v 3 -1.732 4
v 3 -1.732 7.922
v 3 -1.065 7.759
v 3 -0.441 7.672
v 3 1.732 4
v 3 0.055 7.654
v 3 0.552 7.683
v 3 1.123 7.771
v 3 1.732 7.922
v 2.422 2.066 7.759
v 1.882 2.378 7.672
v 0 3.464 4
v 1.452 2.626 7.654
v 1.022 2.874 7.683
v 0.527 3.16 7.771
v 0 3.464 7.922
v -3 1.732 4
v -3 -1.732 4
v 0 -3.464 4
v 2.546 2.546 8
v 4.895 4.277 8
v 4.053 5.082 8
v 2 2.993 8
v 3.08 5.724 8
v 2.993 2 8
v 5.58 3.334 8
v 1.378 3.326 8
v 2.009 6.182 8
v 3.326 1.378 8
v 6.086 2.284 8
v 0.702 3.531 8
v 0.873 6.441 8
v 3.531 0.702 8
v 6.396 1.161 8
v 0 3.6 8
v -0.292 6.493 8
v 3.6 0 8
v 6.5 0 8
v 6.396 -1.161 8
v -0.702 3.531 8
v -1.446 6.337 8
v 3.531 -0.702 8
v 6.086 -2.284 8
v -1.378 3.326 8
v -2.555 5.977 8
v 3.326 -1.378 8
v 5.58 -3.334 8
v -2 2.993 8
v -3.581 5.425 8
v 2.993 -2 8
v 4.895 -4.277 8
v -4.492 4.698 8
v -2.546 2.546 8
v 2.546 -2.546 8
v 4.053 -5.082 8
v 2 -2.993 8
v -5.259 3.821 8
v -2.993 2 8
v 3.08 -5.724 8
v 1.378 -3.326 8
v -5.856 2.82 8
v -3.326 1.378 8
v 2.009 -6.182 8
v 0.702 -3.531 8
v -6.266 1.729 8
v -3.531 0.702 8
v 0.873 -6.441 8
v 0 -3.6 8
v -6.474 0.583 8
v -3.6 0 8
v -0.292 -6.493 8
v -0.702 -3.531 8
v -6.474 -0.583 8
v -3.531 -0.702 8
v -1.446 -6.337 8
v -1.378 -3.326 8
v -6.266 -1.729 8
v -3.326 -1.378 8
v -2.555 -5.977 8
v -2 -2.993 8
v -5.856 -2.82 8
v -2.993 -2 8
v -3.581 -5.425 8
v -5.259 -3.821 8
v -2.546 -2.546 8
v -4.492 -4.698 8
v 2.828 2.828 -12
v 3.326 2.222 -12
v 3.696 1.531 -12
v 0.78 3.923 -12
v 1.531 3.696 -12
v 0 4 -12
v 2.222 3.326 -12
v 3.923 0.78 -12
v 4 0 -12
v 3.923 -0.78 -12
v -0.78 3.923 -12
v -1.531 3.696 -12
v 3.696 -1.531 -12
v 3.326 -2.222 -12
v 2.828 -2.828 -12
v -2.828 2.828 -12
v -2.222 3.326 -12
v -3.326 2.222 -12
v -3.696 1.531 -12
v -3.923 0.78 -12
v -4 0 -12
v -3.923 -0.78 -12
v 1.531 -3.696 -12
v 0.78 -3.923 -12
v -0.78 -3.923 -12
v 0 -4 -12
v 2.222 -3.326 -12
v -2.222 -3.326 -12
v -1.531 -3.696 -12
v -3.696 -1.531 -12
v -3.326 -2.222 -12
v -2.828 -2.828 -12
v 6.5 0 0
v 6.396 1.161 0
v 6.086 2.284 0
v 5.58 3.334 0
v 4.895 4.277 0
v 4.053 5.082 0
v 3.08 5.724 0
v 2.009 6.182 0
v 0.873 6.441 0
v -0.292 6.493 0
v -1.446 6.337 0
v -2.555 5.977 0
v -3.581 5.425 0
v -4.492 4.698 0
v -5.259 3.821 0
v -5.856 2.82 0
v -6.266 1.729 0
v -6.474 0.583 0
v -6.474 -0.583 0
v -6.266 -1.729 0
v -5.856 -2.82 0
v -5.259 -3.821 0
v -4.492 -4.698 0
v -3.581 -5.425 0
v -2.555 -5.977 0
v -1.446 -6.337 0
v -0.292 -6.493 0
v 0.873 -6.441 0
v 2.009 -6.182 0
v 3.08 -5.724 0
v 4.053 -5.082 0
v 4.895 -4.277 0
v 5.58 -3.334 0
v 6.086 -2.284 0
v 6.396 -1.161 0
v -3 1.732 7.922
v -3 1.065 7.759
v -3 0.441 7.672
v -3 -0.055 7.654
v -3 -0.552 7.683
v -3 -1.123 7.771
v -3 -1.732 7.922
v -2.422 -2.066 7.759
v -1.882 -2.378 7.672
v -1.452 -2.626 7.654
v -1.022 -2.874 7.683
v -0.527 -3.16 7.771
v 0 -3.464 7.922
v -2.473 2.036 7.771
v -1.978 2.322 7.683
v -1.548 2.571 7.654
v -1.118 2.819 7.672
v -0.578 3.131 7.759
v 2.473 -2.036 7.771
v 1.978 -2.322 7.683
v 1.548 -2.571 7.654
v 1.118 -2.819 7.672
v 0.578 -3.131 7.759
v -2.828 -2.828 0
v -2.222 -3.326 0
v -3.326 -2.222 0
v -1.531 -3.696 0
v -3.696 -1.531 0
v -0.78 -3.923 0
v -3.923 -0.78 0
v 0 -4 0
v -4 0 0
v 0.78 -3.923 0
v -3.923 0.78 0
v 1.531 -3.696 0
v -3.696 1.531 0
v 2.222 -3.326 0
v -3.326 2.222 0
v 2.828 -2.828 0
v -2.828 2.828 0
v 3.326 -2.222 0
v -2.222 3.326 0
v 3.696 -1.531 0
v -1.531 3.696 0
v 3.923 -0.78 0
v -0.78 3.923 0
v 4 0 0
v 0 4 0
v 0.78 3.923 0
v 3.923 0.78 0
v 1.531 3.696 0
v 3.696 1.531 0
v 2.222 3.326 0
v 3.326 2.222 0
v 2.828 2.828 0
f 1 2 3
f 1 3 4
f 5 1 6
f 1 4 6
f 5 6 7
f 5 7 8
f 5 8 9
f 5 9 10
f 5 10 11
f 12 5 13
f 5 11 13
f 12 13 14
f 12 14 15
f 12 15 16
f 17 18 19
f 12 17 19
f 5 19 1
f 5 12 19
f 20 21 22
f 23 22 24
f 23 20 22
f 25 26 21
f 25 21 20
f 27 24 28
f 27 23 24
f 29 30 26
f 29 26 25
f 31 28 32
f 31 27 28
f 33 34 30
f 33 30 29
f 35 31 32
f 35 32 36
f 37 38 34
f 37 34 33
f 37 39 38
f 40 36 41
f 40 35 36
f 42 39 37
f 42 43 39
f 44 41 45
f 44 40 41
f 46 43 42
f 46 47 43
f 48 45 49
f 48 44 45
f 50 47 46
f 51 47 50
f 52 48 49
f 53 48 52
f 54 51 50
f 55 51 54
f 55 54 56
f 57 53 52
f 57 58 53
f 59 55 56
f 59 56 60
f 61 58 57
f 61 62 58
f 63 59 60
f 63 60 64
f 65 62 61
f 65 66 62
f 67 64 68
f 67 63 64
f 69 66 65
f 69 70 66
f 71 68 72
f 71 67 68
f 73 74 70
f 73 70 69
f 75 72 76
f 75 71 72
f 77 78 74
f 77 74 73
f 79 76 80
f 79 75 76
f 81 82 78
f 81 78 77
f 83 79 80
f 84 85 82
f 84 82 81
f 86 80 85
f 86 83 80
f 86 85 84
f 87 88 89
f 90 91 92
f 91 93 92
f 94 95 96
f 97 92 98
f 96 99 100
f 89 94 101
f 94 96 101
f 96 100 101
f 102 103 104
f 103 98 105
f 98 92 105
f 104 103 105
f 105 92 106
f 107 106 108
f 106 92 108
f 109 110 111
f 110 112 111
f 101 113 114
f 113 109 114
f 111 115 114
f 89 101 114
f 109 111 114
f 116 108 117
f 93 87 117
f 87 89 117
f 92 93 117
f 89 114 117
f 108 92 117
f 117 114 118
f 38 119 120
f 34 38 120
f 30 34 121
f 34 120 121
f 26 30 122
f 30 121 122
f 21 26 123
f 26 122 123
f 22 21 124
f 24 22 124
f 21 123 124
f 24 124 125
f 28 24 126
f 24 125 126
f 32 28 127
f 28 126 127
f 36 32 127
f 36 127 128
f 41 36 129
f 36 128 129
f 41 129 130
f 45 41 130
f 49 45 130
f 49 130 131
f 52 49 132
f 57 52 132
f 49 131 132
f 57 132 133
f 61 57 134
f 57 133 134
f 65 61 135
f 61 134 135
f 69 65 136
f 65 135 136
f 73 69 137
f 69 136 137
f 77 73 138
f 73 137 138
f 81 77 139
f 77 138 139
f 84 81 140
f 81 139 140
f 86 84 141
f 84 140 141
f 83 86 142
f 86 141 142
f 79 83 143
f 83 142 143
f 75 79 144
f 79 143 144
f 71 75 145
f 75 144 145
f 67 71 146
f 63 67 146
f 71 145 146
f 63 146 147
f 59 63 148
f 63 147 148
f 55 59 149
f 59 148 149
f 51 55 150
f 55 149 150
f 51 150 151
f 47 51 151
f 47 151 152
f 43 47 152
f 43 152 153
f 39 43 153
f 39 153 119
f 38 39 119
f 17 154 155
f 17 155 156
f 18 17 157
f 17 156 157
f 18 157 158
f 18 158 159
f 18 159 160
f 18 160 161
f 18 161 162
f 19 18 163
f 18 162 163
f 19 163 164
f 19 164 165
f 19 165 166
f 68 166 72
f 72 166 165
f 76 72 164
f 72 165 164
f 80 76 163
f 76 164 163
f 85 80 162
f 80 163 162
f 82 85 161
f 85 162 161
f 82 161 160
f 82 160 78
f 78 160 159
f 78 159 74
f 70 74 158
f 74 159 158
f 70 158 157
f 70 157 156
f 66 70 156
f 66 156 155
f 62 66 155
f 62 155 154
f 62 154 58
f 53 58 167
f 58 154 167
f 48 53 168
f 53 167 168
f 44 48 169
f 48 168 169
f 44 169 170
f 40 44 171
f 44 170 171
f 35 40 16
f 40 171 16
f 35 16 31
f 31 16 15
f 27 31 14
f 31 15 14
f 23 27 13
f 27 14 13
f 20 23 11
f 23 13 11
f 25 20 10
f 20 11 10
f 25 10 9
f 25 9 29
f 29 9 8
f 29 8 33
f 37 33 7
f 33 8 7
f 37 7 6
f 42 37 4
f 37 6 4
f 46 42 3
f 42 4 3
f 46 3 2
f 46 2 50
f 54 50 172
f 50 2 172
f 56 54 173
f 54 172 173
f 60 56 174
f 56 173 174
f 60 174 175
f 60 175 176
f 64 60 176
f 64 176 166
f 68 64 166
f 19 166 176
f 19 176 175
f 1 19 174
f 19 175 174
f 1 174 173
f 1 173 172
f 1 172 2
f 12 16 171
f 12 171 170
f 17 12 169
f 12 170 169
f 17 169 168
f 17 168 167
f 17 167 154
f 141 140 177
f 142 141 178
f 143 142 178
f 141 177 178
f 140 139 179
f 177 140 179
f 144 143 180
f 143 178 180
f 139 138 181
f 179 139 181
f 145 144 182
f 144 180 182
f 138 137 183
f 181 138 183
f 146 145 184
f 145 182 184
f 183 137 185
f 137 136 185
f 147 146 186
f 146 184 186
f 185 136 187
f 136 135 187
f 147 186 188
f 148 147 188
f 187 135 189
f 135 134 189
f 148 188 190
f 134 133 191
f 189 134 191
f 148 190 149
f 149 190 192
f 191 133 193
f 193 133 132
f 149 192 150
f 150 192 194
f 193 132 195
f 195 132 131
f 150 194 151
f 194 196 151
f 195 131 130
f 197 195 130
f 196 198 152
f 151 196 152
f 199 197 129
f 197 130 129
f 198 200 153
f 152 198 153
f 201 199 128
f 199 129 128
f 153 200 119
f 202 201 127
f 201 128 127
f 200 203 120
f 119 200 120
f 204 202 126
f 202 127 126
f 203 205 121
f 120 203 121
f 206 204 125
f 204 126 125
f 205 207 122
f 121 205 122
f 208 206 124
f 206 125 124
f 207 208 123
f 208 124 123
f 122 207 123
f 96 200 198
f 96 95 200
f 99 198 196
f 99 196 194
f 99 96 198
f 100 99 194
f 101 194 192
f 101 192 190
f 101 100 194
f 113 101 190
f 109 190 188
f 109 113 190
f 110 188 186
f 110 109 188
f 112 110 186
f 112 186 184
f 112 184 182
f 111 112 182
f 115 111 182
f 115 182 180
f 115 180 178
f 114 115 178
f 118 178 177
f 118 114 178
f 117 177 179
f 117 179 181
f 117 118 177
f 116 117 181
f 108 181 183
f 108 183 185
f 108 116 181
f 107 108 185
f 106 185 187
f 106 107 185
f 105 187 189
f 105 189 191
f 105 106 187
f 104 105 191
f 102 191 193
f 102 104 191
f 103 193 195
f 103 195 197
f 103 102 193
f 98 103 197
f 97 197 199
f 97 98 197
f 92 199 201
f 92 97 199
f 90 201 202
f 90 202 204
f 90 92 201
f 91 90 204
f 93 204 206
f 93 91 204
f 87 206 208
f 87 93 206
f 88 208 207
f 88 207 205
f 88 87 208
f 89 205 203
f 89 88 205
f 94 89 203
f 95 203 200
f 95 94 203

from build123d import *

# Parameters (mm, degrees)
SKE1_R      = 6.5
BASE1_DEPTH = 8
BODYSKE_W   = 20
BODYSKE_H   = 4
HEX_2_DEPTH = 4


with BuildPart() as part:
    # Ske1 → Base1 (new body)
    with BuildSketch(Plane.XY):
        Circle(SKE1_R)
    extrude(amount=BASE1_DEPTH)

    # BodySke → BaseBody (revolve)
    with BuildSketch(Plane(origin=(0, 0, 0), x_dir=(0, 0, -1), z_dir=(1, 0, 0)), mode=Mode.PRIVATE) as basebody_sk:
        with Locations((2, 2)):
            Rectangle(BODYSKE_W, BODYSKE_H)
    revolve(basebody_sk.sketch.rotate(Axis((0, 0, 1.385793675), (0, 0, -1)), 90), axis=Axis((0, 0, 1.385793675), (0, 0, -1)))

    # Ske8 → Hex 2 (cut)
    with BuildSketch(Plane.XY.offset(8)):
        Polygon((0, 3.464101615), (-3, 1.732050808), (-3, -1.732050808), (0, -3.464101615), (3, -1.732050808), (3, 1.732050808), align=None)
    extrude(amount=-HEX_2_DEPTH, mode=Mode.SUBTRACT)

    # Chamfer 2 cone 1 section (through the dimple's axis) → Chamfer 2 (revolve, cut)
    with BuildSketch(Plane(origin=(0, 0, 8), x_dir=(0, -1, 0), z_dir=(1, 0, 0))):
        Polygon((0, 0), (3.6, 0), (0, 2.078460969), align=None)
    revolve(axis=Axis((0, 0, 8), (0, 0, -1)), mode=Mode.SUBTRACT)


solid = part.part
